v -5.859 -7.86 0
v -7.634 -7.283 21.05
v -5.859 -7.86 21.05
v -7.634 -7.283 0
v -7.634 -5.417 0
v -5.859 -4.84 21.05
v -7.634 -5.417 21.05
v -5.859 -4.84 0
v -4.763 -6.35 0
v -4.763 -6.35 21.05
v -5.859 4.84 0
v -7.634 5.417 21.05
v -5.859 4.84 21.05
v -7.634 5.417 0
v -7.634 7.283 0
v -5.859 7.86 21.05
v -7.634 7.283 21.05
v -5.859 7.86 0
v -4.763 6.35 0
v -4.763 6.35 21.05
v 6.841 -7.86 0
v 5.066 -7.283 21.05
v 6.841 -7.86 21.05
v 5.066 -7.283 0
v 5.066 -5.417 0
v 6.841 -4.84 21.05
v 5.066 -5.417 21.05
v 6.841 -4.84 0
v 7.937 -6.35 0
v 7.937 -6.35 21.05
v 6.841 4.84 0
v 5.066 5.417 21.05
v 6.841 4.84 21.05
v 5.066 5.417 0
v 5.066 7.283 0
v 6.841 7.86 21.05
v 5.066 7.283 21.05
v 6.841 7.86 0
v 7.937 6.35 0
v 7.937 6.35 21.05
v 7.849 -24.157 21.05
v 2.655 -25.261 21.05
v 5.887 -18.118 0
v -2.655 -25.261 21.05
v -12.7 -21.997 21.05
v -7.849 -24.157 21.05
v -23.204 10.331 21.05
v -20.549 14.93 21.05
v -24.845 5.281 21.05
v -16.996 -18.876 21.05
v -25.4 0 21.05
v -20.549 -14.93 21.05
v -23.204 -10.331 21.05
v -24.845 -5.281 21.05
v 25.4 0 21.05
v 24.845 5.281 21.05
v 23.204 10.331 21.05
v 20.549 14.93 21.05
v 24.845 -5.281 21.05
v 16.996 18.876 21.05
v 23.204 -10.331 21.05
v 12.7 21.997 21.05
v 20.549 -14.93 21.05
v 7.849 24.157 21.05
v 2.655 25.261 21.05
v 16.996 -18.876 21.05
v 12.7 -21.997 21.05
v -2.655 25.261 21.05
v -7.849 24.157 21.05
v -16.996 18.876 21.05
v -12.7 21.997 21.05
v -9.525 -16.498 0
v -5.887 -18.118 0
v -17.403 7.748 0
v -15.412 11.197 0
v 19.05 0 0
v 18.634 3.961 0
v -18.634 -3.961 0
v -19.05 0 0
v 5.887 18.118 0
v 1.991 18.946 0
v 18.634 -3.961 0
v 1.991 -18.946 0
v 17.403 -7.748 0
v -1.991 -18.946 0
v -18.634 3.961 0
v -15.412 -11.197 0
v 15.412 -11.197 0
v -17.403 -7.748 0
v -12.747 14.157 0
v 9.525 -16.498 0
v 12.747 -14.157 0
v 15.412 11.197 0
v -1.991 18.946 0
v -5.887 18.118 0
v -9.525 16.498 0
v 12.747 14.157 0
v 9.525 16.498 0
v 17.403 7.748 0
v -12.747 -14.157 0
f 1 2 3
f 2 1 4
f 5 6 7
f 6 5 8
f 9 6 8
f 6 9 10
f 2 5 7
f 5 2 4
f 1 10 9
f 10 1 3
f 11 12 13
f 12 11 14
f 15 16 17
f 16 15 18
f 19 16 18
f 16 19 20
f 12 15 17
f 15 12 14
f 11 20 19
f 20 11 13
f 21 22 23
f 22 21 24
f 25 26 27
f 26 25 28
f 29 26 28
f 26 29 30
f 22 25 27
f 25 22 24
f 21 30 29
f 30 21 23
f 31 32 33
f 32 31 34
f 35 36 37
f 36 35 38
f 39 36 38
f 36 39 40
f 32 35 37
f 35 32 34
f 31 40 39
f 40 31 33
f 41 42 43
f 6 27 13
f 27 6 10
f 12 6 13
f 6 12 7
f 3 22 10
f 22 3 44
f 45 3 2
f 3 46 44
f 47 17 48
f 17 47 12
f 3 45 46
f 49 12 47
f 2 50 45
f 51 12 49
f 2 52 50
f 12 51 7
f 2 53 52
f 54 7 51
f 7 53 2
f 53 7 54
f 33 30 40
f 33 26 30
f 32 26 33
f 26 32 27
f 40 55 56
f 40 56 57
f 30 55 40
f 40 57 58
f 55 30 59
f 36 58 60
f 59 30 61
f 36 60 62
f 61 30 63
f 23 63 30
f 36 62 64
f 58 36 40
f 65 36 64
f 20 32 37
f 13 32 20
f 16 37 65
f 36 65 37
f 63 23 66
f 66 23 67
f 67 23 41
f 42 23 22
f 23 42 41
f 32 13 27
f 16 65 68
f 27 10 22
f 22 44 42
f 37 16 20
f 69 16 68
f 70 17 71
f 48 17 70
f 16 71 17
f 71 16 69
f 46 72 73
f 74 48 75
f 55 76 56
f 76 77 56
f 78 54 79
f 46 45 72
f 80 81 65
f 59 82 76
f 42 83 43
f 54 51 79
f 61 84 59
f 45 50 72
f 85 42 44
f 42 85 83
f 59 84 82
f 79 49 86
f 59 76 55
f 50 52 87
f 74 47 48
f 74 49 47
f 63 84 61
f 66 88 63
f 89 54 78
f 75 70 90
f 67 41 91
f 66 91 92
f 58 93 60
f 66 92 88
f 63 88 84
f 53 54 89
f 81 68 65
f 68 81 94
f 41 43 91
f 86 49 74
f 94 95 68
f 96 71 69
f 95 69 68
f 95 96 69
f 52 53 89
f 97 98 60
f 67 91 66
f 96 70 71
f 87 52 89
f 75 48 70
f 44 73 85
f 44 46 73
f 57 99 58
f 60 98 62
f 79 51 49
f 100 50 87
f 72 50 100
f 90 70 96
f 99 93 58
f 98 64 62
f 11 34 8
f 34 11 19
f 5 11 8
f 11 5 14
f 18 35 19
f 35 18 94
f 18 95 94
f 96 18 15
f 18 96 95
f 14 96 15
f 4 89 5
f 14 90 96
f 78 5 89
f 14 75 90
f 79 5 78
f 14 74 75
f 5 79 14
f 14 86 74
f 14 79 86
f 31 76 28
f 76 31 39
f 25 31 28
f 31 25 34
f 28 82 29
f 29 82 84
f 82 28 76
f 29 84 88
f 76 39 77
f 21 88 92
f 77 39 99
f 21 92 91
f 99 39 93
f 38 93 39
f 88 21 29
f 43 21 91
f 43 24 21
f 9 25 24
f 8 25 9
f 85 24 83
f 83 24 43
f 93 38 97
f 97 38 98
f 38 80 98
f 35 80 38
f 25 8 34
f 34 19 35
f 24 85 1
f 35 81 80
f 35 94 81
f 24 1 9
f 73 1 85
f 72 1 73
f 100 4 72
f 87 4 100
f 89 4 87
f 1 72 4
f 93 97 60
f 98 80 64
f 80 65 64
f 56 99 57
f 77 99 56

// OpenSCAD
function mm(i) = i*25.4; 
    tubediam = mm(2); //diameter of the cardboard tube at the center
	 thickness= mm(.75); // thickness of material
	 boltwidth = mm(1/8); // desired diameter of bolt holes
//Adding a few comments
//And again

module tubehold(tubediam=mm(2),thickness=mm(.75), boltwidth=mm(1/8),) 
    {
		difference()
			{	
			cylinder(thickness+2, (tubediam-mm(1/2))/2, tubediam/2, 0);
			translate([-tubediam/8,-tubediam/8,0])
				{
				union()
					{				
					translate([0, 0, -1])
						{
						cylinder(thickness+4, boltwidth/2, boltwidth/2, 0);
						}
					translate([0, mm(.5), -1])
						{
							cylinder(thickness+4, boltwidth/2, boltwidth/2, 0);
						}
					translate([mm(.5), 0, -1])
						{
							cylinder(thickness+4, boltwidth/2, boltwidth/2, 0);
						}
					translate([mm(.5), mm(.5), -1])
						{
							cylinder(thickness+4, boltwidth/2, boltwidth/2, 0);
						}
					}
				}
				
		}
	 }

tubehold();
